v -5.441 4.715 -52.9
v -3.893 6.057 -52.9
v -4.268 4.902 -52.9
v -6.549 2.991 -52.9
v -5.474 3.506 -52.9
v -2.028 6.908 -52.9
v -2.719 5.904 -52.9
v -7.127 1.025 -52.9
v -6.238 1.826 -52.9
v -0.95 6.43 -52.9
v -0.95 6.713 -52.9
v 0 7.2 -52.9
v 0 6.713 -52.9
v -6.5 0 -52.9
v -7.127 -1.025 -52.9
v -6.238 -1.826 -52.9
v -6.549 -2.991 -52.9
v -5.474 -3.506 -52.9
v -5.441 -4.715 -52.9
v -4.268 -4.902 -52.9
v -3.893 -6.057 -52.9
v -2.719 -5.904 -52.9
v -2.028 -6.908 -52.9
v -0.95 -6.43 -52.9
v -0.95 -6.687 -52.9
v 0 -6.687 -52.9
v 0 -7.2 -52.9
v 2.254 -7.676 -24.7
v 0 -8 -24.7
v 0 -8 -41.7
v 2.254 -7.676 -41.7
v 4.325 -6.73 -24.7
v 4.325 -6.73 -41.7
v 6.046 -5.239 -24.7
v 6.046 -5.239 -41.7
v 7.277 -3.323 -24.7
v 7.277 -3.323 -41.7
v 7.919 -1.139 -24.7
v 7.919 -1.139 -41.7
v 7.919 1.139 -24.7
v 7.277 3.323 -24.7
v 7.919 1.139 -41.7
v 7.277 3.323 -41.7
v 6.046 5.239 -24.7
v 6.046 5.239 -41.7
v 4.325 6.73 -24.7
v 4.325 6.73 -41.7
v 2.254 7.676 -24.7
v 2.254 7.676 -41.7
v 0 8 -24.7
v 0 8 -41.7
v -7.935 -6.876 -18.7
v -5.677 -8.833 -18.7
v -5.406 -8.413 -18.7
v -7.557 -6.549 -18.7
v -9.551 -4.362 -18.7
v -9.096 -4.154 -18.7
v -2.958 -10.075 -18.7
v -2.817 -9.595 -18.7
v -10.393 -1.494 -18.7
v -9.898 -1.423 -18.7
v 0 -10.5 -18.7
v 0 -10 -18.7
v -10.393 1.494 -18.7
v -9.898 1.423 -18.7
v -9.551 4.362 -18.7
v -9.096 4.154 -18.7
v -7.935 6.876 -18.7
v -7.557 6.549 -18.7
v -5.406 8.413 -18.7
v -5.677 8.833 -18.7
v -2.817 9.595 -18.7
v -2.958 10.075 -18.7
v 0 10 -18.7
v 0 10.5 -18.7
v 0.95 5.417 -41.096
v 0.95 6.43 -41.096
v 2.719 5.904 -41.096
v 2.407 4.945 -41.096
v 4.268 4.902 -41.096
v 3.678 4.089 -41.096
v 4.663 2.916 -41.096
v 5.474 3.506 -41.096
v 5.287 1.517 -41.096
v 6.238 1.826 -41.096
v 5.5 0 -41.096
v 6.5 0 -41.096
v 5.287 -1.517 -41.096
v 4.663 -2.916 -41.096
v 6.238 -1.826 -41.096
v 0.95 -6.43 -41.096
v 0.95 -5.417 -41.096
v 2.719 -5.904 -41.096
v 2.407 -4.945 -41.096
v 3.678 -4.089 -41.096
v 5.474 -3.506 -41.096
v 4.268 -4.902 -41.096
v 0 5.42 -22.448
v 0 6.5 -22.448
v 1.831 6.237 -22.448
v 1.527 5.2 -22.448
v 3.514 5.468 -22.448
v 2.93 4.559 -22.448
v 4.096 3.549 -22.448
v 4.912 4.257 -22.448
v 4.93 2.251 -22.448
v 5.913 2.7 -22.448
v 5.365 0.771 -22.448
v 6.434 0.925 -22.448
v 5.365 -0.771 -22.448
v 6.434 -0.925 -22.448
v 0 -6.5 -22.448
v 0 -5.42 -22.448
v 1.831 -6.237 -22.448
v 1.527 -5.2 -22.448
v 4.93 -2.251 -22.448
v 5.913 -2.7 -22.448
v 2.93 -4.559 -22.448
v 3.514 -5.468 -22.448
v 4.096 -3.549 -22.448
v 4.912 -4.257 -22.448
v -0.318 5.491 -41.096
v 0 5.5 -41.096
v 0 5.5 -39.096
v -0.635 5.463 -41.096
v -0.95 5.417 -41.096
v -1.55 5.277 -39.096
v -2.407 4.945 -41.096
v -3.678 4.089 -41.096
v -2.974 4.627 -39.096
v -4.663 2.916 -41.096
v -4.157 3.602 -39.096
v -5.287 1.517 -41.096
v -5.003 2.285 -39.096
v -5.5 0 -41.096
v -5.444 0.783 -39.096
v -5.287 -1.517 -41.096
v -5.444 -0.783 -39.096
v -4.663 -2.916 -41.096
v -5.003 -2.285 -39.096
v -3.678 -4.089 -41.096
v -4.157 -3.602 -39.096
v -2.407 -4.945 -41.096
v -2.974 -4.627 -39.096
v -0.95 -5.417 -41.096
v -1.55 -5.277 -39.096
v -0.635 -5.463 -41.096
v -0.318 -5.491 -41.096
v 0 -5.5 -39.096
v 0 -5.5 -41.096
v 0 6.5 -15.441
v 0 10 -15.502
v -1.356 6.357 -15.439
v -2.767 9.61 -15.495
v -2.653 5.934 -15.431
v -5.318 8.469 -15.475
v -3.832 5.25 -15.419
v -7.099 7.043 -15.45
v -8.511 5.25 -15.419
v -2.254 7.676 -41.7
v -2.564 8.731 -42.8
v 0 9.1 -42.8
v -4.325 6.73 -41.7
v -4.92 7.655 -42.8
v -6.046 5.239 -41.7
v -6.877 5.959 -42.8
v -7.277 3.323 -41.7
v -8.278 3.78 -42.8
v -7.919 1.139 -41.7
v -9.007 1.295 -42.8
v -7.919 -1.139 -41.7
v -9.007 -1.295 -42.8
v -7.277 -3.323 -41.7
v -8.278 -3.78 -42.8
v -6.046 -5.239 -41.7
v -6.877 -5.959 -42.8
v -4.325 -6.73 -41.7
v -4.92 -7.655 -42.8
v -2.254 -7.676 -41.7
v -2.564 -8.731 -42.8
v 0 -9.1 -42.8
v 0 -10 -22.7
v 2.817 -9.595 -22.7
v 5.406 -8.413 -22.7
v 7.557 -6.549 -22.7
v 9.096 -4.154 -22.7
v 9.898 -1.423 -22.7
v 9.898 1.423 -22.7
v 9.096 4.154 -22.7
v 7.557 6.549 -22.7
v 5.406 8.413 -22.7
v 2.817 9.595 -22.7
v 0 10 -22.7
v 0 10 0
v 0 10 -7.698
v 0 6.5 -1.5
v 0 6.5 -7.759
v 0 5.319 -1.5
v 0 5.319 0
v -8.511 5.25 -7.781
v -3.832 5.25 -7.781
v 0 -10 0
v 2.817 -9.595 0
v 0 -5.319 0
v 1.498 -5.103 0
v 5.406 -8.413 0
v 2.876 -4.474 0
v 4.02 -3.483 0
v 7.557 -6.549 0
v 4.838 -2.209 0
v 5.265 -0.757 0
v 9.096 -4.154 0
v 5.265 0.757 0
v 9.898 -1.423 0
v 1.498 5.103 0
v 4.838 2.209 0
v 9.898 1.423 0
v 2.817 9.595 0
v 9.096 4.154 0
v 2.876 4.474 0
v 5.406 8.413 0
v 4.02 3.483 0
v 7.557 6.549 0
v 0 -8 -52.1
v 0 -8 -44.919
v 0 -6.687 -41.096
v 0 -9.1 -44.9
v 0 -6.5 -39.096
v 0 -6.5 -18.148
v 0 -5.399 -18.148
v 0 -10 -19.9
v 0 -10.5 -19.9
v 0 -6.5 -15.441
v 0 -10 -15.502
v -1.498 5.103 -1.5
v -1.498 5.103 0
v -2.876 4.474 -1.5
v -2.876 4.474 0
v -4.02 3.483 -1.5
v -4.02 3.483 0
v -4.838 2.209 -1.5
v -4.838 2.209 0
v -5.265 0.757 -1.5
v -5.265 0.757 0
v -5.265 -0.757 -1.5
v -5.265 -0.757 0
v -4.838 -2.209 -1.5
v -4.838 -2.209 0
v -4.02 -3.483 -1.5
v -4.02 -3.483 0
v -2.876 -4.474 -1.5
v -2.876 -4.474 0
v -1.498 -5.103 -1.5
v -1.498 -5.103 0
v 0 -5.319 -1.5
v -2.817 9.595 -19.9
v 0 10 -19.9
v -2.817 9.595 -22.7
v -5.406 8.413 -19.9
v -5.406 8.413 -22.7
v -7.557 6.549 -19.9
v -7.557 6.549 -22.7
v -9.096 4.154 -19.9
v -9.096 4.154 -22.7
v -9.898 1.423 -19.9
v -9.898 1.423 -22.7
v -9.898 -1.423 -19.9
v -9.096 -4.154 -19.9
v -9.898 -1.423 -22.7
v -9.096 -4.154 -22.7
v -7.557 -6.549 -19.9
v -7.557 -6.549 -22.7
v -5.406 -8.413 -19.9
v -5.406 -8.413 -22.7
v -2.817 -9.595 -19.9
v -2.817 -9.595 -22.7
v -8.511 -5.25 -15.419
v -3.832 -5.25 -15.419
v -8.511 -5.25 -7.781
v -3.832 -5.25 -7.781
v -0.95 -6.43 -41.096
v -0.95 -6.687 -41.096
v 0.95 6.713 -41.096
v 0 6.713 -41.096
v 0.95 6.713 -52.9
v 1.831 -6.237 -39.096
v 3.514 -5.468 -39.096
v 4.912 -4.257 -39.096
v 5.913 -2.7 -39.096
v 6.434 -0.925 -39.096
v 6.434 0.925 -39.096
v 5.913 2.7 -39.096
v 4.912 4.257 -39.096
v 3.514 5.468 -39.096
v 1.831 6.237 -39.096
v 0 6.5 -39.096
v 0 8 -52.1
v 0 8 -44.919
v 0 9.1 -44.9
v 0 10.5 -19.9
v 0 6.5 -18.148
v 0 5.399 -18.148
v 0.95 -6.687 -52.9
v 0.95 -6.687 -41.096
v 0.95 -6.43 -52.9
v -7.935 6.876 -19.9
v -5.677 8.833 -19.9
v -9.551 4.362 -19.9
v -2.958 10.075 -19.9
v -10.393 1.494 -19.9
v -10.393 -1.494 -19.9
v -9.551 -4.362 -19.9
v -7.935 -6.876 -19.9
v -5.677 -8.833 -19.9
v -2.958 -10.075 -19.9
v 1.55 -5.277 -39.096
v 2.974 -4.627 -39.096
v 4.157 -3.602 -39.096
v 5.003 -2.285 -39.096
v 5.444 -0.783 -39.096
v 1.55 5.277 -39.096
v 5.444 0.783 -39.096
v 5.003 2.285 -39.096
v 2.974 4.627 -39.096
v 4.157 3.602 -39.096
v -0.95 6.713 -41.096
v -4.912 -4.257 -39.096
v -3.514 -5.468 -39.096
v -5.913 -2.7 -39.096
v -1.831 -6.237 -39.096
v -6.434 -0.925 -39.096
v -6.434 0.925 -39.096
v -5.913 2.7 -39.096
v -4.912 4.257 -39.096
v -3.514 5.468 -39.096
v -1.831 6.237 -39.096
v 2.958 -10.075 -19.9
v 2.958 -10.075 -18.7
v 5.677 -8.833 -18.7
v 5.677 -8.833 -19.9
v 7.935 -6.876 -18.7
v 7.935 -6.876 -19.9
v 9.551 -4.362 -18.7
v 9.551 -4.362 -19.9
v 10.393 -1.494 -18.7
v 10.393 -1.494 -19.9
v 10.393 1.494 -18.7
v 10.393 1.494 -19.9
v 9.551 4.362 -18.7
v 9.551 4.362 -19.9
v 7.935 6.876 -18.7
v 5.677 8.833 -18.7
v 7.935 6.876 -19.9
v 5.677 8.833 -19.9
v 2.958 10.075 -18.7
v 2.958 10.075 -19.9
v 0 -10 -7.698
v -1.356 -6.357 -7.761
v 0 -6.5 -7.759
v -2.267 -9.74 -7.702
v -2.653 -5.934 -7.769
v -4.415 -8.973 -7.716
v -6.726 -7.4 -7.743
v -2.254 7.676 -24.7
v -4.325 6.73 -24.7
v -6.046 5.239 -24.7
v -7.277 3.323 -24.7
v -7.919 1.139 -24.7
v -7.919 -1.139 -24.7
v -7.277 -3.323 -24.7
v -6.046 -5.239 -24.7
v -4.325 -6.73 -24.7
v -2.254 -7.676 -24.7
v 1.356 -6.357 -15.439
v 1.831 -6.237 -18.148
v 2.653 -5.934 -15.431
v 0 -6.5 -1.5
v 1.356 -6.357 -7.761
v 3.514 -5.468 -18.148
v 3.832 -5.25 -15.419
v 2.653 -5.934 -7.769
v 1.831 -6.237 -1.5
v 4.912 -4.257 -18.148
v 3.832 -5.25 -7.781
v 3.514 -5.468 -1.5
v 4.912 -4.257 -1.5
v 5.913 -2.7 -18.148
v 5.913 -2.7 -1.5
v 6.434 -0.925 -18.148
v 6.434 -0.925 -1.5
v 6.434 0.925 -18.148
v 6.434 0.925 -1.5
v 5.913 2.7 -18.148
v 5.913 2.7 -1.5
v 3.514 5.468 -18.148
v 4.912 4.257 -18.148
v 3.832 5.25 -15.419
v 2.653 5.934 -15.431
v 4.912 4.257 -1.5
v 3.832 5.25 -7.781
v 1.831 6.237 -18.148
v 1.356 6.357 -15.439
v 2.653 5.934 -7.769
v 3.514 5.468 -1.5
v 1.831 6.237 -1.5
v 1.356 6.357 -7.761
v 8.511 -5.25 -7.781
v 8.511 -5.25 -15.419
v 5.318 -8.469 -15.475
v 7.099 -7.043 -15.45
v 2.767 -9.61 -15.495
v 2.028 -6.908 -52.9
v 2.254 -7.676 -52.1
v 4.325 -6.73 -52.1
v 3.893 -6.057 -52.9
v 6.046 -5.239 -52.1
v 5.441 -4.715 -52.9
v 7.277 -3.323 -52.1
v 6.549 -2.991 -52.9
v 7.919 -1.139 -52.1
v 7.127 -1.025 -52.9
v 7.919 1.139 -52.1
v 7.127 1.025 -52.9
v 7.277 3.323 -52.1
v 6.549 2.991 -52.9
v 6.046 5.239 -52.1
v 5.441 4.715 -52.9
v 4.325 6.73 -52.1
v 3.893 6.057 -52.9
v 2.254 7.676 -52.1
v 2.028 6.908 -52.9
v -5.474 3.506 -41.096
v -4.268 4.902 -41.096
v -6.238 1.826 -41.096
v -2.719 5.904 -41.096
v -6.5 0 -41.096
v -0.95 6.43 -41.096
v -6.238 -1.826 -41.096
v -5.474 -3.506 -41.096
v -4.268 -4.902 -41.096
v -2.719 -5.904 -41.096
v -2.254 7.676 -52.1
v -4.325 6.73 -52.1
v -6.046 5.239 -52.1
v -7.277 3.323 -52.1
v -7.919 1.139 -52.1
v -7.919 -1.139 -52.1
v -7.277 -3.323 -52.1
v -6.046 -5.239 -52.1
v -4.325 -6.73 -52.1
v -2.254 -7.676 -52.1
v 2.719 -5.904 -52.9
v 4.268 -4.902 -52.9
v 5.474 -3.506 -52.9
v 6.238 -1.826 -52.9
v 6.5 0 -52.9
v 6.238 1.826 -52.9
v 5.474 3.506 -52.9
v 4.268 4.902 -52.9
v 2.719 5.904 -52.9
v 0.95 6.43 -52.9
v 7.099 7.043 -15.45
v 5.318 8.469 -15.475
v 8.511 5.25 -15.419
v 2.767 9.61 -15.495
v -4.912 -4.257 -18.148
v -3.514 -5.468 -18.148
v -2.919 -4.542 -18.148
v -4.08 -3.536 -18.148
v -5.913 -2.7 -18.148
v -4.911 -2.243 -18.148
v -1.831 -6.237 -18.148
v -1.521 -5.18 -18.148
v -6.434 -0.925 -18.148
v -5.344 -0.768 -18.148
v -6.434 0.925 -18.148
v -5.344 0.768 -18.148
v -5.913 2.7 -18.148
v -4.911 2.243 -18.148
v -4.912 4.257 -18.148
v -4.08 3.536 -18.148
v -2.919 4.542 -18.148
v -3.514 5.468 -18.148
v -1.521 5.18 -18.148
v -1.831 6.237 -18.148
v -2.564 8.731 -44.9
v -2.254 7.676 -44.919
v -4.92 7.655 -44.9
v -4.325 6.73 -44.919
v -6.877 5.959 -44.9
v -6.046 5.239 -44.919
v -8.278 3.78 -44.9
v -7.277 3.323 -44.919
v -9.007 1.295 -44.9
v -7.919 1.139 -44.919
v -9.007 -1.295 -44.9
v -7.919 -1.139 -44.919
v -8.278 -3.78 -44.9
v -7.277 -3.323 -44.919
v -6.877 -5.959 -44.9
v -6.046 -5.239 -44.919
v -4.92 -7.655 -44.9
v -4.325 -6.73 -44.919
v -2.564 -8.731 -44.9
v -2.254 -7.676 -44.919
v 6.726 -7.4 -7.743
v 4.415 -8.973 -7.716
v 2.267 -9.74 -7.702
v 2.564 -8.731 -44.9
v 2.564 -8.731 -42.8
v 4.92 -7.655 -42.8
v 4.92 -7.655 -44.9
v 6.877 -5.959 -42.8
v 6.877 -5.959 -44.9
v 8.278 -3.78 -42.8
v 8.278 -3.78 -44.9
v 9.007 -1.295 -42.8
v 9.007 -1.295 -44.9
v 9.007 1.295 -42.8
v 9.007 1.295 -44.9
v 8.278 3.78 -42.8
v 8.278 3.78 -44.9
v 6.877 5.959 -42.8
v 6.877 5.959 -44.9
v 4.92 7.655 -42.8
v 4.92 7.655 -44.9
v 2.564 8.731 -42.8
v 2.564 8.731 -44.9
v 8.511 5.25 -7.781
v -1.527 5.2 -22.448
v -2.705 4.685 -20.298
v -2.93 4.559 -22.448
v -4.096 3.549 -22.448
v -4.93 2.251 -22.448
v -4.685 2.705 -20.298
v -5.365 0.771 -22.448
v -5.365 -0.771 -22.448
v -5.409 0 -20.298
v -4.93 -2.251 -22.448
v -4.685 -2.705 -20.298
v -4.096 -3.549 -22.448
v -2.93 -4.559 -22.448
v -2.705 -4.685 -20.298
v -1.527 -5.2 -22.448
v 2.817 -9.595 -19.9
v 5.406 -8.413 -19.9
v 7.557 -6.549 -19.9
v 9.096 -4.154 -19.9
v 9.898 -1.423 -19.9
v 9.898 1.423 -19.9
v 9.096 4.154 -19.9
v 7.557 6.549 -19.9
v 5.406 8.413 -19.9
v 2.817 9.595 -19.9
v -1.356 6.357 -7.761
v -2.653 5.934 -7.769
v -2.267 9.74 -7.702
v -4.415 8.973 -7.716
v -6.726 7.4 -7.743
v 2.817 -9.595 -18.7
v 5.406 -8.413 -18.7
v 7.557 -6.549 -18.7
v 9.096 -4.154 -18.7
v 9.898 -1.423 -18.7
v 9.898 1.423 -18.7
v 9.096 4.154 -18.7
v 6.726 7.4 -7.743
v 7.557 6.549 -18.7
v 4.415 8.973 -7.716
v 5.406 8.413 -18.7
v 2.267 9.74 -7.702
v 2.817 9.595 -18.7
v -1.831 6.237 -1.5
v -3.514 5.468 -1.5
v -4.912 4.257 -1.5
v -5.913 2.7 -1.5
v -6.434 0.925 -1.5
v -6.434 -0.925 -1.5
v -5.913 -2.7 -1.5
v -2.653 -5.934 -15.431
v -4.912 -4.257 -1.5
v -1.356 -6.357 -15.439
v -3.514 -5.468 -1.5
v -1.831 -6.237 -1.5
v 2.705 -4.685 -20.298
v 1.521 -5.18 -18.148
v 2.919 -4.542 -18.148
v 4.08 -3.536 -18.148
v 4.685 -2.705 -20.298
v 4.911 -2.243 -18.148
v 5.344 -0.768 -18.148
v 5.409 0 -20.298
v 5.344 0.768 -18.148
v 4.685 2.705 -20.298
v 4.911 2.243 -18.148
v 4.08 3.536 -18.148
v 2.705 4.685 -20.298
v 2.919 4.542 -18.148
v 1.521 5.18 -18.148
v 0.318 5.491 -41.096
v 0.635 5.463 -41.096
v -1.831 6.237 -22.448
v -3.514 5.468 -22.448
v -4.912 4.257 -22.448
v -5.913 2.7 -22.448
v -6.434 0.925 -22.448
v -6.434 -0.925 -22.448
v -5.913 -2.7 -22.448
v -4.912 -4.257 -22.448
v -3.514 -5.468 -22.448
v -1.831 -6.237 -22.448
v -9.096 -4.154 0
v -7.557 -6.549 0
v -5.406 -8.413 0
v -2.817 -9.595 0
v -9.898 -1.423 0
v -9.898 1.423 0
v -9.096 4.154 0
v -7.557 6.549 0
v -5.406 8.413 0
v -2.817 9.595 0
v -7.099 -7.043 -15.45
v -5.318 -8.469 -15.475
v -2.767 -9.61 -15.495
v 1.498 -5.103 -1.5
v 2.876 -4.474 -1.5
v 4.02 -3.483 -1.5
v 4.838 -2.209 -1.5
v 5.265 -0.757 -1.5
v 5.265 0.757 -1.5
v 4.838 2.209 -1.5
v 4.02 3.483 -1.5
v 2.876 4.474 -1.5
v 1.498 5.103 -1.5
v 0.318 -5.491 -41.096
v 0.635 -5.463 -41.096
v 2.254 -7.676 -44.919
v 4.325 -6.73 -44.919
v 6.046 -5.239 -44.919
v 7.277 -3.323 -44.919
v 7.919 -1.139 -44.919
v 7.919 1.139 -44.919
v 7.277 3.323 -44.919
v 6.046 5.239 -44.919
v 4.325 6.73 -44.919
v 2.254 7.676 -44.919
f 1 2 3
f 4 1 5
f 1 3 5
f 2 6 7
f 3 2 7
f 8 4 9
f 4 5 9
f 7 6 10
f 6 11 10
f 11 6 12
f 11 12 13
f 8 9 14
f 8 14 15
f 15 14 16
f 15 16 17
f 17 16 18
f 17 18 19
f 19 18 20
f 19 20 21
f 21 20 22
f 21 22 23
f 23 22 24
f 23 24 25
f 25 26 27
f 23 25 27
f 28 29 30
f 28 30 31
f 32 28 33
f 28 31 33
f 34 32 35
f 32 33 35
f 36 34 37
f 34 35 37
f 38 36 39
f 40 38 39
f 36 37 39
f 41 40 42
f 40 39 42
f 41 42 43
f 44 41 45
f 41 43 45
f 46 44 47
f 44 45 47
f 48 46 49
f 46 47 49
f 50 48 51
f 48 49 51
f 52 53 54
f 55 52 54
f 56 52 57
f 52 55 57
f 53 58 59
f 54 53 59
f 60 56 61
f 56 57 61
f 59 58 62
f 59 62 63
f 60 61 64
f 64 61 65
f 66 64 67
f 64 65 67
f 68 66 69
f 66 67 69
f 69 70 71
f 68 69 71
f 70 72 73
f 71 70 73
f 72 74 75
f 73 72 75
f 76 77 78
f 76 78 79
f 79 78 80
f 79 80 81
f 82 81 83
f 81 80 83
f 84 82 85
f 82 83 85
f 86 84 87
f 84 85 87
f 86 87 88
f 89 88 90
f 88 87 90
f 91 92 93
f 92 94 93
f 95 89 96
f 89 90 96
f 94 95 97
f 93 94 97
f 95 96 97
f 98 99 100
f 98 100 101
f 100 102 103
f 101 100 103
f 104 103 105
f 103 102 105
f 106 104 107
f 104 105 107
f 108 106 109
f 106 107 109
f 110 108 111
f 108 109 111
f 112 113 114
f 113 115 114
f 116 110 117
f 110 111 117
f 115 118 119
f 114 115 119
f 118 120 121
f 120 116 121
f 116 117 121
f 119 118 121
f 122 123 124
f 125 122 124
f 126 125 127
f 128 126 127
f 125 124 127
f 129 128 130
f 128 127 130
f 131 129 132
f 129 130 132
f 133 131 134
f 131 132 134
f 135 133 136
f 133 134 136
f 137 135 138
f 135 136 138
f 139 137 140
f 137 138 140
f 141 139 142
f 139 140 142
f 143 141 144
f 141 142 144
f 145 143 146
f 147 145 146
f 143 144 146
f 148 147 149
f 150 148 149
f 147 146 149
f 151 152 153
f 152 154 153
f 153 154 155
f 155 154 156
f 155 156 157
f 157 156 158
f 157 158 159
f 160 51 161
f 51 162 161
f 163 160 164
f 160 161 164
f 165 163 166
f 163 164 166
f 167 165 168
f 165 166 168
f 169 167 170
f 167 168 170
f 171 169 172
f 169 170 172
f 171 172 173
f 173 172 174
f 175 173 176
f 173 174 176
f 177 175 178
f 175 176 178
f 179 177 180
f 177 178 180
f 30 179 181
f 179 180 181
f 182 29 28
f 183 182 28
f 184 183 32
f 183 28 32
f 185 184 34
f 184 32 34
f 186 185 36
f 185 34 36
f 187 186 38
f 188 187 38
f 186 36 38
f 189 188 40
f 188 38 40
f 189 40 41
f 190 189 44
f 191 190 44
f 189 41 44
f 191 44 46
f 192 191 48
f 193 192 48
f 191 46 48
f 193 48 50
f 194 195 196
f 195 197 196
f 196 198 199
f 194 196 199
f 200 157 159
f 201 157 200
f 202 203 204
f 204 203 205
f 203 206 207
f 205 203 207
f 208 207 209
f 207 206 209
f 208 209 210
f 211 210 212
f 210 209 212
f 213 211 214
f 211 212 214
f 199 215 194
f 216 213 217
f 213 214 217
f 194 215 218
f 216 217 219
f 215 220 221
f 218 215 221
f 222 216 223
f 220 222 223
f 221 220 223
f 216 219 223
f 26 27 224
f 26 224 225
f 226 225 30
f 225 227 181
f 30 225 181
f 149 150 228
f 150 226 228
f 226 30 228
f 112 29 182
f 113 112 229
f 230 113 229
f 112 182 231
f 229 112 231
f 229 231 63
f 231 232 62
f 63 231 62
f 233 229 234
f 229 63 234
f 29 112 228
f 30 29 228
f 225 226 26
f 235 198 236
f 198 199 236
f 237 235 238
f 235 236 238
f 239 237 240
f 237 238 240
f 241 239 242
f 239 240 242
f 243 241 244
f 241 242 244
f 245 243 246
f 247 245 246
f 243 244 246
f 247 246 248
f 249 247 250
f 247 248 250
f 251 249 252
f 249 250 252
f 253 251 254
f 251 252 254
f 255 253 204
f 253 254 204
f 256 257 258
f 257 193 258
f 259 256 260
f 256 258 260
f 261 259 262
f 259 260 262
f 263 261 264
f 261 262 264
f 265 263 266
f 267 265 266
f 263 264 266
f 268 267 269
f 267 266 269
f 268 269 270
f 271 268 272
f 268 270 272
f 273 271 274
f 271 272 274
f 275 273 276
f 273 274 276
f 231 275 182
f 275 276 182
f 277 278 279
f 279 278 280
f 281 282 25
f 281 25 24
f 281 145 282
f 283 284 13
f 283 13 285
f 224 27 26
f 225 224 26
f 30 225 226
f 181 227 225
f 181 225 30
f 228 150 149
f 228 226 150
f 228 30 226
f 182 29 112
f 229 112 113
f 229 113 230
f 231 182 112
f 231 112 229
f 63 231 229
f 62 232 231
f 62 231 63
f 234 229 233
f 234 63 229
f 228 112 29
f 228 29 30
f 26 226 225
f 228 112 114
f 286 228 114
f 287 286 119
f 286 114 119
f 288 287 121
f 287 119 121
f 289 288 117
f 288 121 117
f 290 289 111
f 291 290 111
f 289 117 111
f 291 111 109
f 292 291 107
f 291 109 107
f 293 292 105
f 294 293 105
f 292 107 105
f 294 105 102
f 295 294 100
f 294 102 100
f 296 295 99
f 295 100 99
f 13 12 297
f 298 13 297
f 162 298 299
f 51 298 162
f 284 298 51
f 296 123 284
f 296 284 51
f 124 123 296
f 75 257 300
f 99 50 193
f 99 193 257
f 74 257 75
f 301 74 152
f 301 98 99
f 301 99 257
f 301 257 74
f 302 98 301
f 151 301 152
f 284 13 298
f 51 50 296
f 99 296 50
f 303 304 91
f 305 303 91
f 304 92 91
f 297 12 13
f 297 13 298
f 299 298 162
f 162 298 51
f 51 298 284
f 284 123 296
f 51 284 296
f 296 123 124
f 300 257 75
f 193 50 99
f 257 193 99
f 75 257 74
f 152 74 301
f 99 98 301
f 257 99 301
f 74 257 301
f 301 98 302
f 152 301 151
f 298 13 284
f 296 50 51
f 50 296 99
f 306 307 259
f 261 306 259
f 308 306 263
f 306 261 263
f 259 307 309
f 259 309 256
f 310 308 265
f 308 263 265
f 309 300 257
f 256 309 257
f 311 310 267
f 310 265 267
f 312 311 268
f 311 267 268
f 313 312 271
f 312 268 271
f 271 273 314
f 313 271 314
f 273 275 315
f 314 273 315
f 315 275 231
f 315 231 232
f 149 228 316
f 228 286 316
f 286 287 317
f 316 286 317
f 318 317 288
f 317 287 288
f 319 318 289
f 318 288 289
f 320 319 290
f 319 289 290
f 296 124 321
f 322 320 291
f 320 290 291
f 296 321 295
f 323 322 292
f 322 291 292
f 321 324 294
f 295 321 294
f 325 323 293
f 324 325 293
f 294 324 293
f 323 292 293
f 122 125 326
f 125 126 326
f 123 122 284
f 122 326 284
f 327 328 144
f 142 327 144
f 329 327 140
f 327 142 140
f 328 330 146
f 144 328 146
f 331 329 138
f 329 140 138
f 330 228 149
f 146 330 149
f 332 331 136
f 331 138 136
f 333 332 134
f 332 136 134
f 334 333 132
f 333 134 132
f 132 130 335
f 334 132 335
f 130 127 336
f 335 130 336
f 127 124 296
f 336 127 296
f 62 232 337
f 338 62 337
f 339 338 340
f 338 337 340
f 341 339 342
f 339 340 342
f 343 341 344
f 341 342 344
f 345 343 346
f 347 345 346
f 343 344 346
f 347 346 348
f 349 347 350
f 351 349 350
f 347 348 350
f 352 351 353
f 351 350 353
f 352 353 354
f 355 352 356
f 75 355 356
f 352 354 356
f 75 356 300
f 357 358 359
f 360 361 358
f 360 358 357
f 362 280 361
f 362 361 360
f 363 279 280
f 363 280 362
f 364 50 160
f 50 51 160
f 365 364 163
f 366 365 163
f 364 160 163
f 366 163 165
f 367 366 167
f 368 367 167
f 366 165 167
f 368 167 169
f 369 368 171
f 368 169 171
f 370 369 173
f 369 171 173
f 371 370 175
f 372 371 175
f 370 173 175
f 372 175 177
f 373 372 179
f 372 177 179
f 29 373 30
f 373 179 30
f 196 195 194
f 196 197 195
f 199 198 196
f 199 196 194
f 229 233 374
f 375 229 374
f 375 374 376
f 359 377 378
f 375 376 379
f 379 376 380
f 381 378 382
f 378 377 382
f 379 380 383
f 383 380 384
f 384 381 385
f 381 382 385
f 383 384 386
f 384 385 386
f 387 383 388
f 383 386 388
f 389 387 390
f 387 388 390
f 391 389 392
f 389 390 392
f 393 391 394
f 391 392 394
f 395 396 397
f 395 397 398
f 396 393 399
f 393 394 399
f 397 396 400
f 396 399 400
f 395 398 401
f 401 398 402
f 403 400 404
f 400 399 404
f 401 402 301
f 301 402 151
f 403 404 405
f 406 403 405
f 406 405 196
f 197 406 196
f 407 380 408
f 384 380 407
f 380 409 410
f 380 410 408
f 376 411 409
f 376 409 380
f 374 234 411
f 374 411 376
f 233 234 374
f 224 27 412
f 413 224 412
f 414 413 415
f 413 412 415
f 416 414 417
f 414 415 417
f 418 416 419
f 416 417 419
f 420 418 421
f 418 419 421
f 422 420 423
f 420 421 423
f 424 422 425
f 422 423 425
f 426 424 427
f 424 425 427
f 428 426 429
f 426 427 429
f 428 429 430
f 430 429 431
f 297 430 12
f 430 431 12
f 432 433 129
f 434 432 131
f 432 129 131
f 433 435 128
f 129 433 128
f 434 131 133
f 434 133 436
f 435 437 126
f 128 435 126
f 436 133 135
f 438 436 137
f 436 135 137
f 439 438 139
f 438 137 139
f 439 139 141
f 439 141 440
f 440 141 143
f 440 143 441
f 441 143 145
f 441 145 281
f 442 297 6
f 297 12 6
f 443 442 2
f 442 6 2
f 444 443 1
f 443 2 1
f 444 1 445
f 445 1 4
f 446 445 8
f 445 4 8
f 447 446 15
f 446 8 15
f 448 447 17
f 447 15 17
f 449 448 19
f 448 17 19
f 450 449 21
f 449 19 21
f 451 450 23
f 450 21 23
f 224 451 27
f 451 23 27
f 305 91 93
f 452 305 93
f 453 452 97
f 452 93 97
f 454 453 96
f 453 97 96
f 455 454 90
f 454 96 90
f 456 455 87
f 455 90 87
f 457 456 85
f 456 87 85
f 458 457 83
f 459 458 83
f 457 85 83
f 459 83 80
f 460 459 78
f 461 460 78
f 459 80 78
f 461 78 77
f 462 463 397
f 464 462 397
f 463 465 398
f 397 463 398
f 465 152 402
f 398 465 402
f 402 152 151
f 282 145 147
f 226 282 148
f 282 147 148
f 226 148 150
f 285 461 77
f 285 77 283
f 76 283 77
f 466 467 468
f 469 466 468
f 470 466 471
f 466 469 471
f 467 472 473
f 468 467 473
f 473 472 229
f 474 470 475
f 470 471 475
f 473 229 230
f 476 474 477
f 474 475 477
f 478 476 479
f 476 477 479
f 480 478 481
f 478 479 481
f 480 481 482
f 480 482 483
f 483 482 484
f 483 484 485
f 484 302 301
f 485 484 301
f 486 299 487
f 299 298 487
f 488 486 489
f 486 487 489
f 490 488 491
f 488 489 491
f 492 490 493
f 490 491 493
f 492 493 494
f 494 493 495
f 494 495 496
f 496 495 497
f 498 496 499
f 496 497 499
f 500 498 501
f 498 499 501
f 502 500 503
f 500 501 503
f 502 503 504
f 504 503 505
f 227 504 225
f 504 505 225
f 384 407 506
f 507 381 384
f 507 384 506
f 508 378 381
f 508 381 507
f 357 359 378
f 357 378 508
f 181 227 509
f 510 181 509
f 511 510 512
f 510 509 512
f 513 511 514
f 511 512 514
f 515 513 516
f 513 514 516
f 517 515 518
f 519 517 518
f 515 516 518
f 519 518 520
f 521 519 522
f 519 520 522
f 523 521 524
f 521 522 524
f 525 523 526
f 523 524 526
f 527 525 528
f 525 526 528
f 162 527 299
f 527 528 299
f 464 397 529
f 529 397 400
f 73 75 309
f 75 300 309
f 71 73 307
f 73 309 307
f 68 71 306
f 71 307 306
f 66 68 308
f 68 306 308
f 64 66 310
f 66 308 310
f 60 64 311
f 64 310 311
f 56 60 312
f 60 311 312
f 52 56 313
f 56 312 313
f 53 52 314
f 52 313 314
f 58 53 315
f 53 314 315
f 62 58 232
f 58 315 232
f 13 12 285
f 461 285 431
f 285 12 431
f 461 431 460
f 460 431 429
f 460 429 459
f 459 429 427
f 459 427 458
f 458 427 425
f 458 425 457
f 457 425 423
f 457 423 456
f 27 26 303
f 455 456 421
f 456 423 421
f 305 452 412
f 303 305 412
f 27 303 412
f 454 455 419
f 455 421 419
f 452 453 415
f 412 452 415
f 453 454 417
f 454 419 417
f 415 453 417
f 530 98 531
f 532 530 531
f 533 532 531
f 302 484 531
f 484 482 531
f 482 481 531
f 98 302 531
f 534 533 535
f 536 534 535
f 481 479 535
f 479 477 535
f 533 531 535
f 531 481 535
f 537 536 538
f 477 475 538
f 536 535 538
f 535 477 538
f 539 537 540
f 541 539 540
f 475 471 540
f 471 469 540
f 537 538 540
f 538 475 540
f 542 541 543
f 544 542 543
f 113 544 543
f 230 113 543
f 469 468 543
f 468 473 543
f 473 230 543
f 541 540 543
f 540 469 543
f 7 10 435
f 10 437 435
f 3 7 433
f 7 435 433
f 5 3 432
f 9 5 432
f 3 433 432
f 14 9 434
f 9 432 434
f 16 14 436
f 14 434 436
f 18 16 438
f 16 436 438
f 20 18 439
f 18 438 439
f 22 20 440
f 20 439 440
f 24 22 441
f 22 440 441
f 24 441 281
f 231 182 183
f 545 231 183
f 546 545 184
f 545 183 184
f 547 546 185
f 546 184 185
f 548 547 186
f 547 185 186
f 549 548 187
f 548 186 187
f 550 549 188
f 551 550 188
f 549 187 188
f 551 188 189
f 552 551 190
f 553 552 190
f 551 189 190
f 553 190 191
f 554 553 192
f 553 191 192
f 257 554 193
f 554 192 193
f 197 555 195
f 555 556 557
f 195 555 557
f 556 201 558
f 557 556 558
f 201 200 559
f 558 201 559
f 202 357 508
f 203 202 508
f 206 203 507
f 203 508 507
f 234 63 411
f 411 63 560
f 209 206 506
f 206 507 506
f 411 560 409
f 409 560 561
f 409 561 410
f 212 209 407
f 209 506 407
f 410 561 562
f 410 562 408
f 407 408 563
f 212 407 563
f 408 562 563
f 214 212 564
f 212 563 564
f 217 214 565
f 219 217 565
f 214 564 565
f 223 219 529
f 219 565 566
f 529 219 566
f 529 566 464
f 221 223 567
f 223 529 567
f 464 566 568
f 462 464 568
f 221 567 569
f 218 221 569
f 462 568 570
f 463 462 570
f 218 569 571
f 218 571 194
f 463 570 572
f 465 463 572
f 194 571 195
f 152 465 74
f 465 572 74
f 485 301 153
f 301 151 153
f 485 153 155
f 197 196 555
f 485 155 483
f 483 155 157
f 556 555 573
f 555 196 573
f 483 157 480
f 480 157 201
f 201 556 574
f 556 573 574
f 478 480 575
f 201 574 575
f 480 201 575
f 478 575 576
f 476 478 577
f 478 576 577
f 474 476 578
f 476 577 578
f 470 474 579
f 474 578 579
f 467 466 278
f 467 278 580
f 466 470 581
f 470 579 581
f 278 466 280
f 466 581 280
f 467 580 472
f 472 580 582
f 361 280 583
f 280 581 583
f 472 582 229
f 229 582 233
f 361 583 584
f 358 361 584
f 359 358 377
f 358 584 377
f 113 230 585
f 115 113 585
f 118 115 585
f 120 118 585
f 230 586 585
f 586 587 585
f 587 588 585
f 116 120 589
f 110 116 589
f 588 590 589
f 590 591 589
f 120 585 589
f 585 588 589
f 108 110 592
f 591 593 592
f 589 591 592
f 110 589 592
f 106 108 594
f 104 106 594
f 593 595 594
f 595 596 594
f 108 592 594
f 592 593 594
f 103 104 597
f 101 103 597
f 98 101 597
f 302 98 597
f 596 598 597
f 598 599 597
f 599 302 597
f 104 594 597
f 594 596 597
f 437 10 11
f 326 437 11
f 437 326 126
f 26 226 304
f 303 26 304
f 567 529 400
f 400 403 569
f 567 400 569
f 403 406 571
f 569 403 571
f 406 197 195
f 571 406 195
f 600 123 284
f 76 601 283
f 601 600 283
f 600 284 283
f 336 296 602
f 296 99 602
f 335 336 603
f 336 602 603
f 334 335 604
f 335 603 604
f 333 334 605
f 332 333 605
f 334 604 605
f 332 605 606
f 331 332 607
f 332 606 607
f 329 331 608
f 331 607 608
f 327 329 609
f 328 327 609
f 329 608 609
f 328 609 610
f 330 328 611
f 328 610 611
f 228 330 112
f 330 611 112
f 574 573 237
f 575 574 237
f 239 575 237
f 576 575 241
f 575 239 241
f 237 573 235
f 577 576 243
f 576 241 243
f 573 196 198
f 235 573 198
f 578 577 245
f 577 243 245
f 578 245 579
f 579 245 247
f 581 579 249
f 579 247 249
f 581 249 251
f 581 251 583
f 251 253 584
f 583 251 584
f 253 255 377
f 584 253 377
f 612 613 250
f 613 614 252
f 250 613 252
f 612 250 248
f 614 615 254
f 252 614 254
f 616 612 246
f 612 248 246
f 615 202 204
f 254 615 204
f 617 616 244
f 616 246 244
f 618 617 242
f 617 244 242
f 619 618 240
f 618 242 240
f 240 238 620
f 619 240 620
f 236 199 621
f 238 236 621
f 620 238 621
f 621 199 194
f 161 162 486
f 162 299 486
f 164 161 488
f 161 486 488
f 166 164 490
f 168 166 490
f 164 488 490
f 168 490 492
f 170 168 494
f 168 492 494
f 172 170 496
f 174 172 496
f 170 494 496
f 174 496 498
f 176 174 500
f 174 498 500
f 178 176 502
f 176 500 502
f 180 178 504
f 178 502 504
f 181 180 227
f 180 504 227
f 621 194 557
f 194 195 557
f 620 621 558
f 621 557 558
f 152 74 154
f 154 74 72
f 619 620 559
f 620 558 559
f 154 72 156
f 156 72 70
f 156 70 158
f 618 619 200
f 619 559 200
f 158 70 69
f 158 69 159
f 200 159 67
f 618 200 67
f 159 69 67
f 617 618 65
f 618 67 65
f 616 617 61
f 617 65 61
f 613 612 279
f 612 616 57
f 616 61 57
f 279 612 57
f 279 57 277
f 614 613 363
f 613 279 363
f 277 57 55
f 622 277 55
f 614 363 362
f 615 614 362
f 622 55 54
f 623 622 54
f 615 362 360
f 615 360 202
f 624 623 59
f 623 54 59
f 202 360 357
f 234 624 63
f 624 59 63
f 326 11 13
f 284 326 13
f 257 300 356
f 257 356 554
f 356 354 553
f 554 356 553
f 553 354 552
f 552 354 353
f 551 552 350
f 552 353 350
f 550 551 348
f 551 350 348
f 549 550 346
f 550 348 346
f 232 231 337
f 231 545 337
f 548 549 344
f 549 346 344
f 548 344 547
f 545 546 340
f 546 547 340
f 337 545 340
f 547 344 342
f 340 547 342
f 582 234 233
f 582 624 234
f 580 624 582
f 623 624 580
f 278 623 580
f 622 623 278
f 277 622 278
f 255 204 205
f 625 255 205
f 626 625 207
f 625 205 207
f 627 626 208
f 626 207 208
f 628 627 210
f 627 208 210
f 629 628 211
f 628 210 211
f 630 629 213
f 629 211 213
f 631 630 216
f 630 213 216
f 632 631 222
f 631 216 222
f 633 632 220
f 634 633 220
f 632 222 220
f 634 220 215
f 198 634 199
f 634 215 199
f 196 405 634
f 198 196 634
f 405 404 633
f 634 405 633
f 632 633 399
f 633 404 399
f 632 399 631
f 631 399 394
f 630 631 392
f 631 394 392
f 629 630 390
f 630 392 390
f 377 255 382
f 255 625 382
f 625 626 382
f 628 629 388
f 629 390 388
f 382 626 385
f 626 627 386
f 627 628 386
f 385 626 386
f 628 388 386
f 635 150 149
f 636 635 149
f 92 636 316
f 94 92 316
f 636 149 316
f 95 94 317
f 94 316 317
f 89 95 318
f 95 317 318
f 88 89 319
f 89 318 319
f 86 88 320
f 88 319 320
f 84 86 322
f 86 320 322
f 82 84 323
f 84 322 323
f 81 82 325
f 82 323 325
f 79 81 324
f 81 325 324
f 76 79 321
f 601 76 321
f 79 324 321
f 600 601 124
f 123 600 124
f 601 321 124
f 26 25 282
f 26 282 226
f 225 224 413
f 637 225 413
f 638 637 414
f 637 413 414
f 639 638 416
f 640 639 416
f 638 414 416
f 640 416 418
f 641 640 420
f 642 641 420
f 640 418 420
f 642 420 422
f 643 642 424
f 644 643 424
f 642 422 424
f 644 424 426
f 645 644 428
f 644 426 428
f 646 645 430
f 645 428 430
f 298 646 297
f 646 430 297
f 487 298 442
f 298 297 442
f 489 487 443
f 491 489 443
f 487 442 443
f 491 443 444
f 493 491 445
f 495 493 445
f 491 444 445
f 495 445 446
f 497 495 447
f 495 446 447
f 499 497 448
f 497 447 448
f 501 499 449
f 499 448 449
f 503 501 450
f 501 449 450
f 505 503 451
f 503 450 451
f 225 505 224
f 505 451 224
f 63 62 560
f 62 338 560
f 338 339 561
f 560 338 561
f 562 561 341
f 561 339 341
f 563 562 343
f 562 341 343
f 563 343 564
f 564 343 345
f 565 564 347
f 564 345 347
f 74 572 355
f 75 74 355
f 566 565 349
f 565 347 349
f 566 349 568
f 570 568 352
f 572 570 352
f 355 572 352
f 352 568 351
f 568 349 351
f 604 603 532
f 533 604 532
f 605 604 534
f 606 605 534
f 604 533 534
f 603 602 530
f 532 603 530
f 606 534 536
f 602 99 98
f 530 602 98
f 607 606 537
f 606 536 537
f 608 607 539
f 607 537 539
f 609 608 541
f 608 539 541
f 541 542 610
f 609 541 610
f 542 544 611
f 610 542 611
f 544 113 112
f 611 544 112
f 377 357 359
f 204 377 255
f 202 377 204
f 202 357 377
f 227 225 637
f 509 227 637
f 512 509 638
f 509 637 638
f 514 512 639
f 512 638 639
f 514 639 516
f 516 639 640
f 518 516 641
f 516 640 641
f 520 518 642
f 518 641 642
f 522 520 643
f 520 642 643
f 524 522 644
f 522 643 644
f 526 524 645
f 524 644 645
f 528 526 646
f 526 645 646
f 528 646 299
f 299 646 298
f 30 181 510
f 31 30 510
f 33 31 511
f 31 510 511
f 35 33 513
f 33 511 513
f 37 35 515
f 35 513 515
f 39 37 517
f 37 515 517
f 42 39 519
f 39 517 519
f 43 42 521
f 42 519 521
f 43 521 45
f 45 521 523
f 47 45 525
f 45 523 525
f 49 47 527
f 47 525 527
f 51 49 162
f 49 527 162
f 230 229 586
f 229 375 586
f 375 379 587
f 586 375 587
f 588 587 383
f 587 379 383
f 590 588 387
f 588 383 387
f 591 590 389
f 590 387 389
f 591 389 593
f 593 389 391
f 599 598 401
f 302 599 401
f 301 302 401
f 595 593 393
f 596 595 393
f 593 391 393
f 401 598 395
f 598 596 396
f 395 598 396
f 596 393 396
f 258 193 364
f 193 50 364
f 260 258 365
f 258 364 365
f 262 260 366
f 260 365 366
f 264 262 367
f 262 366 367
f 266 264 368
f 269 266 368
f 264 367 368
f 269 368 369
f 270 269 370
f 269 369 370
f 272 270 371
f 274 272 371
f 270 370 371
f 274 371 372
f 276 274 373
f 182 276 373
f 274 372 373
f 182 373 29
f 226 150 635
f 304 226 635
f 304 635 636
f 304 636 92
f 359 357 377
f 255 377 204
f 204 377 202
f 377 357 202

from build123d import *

# Parameters (mm, degrees)
CUT_EXTRUDE1_DEPTH      = 11.5
CUT_EXTRUDE1_DEPTH_BACK = 11.5
CUT_EXTRUDE2_START      = -52.9
SKETCH4_W               = 1.9
SKETCH4_H               = 13.4
CUT_EXTRUDE2_DEPTH      = 11.80355


with BuildPart() as part:
    # Sketch1 → Revolve1 (revolve)
    with BuildSketch(Plane(origin=(0, 0, 0), x_dir=(0, 0, -1), z_dir=(1, 0, 0))):
        Polygon((0, -10), (18.7, -10), (18.7, -10.5), (19.9, -10.5), (19.9, -10), (22.7, -10), (24.7, -8), (41.7, -8), (42.8, -9.1), (44.9, -9.1), (44.919200571, -8), (52.1, -8), (52.9, -7.2), (52.9, -6.5), (41.09645045, -6.5), (41.09645045, -5.5), (39.09645045, -5.5), (39.09645045, -6.5), (22.448200248, -6.5), (22.448200248, -5.419751362), (18.148250202, -5.399024551), (18.148250202, -6.5), (1.5, -6.5), (1.5, -5.318775912), (0, -5.318775912), align=None)
    revolve(axis=Axis((0, 0, -52.9), (0, 0, 1)))

    # Sketch3 → Cut-Extrude1 (cut, two sides)
    with BuildSketch(Plane(origin=(0, 0, 0), x_dir=(0, 0, -1), z_dir=(1, 0, 0))) as cut_extrude1_sk:
        Polygon((7.780799429, -5.25), (7.581057749, -16.693193187), (15.618942251, -16.693193187), (15.419200571, -5.25), align=None)
        Polygon((7.581057749, 16.693193187), (15.618942251, 16.693193187), (15.419200571, 5.25), (7.780799429, 5.25), align=None)
    extrude(amount=CUT_EXTRUDE1_DEPTH, mode=Mode.SUBTRACT)
    extrude(cut_extrude1_sk.sketch, amount=-CUT_EXTRUDE1_DEPTH_BACK, mode=Mode.SUBTRACT)

    # Sketch4 → Cut-Extrude2 (cut)
    with BuildSketch(Plane.XY.offset(CUT_EXTRUDE2_START)):
        with Locations((0, 0.012903397)):
            Rectangle(SKETCH4_W, SKETCH4_H)
    extrude(amount=CUT_EXTRUDE2_DEPTH, mode=Mode.SUBTRACT)


with BuildPart() as body_2:
    # Split1: the piece on the far side of the plane
    add(part.part)
    split(bisect_by=Plane(origin=(0, 0, 0), x_dir=(0, 0, 1), z_dir=(1, 0, 0)), keep=Keep.BOTTOM)


with BuildPart() as part_1:
    add(part.part)

    # Split1
    split(bisect_by=Plane(origin=(0, 0, 0), x_dir=(0, 0, 1), z_dir=(1, 0, 0)), keep=Keep.TOP)


solid = Compound([body_2.part, part_1.part])
